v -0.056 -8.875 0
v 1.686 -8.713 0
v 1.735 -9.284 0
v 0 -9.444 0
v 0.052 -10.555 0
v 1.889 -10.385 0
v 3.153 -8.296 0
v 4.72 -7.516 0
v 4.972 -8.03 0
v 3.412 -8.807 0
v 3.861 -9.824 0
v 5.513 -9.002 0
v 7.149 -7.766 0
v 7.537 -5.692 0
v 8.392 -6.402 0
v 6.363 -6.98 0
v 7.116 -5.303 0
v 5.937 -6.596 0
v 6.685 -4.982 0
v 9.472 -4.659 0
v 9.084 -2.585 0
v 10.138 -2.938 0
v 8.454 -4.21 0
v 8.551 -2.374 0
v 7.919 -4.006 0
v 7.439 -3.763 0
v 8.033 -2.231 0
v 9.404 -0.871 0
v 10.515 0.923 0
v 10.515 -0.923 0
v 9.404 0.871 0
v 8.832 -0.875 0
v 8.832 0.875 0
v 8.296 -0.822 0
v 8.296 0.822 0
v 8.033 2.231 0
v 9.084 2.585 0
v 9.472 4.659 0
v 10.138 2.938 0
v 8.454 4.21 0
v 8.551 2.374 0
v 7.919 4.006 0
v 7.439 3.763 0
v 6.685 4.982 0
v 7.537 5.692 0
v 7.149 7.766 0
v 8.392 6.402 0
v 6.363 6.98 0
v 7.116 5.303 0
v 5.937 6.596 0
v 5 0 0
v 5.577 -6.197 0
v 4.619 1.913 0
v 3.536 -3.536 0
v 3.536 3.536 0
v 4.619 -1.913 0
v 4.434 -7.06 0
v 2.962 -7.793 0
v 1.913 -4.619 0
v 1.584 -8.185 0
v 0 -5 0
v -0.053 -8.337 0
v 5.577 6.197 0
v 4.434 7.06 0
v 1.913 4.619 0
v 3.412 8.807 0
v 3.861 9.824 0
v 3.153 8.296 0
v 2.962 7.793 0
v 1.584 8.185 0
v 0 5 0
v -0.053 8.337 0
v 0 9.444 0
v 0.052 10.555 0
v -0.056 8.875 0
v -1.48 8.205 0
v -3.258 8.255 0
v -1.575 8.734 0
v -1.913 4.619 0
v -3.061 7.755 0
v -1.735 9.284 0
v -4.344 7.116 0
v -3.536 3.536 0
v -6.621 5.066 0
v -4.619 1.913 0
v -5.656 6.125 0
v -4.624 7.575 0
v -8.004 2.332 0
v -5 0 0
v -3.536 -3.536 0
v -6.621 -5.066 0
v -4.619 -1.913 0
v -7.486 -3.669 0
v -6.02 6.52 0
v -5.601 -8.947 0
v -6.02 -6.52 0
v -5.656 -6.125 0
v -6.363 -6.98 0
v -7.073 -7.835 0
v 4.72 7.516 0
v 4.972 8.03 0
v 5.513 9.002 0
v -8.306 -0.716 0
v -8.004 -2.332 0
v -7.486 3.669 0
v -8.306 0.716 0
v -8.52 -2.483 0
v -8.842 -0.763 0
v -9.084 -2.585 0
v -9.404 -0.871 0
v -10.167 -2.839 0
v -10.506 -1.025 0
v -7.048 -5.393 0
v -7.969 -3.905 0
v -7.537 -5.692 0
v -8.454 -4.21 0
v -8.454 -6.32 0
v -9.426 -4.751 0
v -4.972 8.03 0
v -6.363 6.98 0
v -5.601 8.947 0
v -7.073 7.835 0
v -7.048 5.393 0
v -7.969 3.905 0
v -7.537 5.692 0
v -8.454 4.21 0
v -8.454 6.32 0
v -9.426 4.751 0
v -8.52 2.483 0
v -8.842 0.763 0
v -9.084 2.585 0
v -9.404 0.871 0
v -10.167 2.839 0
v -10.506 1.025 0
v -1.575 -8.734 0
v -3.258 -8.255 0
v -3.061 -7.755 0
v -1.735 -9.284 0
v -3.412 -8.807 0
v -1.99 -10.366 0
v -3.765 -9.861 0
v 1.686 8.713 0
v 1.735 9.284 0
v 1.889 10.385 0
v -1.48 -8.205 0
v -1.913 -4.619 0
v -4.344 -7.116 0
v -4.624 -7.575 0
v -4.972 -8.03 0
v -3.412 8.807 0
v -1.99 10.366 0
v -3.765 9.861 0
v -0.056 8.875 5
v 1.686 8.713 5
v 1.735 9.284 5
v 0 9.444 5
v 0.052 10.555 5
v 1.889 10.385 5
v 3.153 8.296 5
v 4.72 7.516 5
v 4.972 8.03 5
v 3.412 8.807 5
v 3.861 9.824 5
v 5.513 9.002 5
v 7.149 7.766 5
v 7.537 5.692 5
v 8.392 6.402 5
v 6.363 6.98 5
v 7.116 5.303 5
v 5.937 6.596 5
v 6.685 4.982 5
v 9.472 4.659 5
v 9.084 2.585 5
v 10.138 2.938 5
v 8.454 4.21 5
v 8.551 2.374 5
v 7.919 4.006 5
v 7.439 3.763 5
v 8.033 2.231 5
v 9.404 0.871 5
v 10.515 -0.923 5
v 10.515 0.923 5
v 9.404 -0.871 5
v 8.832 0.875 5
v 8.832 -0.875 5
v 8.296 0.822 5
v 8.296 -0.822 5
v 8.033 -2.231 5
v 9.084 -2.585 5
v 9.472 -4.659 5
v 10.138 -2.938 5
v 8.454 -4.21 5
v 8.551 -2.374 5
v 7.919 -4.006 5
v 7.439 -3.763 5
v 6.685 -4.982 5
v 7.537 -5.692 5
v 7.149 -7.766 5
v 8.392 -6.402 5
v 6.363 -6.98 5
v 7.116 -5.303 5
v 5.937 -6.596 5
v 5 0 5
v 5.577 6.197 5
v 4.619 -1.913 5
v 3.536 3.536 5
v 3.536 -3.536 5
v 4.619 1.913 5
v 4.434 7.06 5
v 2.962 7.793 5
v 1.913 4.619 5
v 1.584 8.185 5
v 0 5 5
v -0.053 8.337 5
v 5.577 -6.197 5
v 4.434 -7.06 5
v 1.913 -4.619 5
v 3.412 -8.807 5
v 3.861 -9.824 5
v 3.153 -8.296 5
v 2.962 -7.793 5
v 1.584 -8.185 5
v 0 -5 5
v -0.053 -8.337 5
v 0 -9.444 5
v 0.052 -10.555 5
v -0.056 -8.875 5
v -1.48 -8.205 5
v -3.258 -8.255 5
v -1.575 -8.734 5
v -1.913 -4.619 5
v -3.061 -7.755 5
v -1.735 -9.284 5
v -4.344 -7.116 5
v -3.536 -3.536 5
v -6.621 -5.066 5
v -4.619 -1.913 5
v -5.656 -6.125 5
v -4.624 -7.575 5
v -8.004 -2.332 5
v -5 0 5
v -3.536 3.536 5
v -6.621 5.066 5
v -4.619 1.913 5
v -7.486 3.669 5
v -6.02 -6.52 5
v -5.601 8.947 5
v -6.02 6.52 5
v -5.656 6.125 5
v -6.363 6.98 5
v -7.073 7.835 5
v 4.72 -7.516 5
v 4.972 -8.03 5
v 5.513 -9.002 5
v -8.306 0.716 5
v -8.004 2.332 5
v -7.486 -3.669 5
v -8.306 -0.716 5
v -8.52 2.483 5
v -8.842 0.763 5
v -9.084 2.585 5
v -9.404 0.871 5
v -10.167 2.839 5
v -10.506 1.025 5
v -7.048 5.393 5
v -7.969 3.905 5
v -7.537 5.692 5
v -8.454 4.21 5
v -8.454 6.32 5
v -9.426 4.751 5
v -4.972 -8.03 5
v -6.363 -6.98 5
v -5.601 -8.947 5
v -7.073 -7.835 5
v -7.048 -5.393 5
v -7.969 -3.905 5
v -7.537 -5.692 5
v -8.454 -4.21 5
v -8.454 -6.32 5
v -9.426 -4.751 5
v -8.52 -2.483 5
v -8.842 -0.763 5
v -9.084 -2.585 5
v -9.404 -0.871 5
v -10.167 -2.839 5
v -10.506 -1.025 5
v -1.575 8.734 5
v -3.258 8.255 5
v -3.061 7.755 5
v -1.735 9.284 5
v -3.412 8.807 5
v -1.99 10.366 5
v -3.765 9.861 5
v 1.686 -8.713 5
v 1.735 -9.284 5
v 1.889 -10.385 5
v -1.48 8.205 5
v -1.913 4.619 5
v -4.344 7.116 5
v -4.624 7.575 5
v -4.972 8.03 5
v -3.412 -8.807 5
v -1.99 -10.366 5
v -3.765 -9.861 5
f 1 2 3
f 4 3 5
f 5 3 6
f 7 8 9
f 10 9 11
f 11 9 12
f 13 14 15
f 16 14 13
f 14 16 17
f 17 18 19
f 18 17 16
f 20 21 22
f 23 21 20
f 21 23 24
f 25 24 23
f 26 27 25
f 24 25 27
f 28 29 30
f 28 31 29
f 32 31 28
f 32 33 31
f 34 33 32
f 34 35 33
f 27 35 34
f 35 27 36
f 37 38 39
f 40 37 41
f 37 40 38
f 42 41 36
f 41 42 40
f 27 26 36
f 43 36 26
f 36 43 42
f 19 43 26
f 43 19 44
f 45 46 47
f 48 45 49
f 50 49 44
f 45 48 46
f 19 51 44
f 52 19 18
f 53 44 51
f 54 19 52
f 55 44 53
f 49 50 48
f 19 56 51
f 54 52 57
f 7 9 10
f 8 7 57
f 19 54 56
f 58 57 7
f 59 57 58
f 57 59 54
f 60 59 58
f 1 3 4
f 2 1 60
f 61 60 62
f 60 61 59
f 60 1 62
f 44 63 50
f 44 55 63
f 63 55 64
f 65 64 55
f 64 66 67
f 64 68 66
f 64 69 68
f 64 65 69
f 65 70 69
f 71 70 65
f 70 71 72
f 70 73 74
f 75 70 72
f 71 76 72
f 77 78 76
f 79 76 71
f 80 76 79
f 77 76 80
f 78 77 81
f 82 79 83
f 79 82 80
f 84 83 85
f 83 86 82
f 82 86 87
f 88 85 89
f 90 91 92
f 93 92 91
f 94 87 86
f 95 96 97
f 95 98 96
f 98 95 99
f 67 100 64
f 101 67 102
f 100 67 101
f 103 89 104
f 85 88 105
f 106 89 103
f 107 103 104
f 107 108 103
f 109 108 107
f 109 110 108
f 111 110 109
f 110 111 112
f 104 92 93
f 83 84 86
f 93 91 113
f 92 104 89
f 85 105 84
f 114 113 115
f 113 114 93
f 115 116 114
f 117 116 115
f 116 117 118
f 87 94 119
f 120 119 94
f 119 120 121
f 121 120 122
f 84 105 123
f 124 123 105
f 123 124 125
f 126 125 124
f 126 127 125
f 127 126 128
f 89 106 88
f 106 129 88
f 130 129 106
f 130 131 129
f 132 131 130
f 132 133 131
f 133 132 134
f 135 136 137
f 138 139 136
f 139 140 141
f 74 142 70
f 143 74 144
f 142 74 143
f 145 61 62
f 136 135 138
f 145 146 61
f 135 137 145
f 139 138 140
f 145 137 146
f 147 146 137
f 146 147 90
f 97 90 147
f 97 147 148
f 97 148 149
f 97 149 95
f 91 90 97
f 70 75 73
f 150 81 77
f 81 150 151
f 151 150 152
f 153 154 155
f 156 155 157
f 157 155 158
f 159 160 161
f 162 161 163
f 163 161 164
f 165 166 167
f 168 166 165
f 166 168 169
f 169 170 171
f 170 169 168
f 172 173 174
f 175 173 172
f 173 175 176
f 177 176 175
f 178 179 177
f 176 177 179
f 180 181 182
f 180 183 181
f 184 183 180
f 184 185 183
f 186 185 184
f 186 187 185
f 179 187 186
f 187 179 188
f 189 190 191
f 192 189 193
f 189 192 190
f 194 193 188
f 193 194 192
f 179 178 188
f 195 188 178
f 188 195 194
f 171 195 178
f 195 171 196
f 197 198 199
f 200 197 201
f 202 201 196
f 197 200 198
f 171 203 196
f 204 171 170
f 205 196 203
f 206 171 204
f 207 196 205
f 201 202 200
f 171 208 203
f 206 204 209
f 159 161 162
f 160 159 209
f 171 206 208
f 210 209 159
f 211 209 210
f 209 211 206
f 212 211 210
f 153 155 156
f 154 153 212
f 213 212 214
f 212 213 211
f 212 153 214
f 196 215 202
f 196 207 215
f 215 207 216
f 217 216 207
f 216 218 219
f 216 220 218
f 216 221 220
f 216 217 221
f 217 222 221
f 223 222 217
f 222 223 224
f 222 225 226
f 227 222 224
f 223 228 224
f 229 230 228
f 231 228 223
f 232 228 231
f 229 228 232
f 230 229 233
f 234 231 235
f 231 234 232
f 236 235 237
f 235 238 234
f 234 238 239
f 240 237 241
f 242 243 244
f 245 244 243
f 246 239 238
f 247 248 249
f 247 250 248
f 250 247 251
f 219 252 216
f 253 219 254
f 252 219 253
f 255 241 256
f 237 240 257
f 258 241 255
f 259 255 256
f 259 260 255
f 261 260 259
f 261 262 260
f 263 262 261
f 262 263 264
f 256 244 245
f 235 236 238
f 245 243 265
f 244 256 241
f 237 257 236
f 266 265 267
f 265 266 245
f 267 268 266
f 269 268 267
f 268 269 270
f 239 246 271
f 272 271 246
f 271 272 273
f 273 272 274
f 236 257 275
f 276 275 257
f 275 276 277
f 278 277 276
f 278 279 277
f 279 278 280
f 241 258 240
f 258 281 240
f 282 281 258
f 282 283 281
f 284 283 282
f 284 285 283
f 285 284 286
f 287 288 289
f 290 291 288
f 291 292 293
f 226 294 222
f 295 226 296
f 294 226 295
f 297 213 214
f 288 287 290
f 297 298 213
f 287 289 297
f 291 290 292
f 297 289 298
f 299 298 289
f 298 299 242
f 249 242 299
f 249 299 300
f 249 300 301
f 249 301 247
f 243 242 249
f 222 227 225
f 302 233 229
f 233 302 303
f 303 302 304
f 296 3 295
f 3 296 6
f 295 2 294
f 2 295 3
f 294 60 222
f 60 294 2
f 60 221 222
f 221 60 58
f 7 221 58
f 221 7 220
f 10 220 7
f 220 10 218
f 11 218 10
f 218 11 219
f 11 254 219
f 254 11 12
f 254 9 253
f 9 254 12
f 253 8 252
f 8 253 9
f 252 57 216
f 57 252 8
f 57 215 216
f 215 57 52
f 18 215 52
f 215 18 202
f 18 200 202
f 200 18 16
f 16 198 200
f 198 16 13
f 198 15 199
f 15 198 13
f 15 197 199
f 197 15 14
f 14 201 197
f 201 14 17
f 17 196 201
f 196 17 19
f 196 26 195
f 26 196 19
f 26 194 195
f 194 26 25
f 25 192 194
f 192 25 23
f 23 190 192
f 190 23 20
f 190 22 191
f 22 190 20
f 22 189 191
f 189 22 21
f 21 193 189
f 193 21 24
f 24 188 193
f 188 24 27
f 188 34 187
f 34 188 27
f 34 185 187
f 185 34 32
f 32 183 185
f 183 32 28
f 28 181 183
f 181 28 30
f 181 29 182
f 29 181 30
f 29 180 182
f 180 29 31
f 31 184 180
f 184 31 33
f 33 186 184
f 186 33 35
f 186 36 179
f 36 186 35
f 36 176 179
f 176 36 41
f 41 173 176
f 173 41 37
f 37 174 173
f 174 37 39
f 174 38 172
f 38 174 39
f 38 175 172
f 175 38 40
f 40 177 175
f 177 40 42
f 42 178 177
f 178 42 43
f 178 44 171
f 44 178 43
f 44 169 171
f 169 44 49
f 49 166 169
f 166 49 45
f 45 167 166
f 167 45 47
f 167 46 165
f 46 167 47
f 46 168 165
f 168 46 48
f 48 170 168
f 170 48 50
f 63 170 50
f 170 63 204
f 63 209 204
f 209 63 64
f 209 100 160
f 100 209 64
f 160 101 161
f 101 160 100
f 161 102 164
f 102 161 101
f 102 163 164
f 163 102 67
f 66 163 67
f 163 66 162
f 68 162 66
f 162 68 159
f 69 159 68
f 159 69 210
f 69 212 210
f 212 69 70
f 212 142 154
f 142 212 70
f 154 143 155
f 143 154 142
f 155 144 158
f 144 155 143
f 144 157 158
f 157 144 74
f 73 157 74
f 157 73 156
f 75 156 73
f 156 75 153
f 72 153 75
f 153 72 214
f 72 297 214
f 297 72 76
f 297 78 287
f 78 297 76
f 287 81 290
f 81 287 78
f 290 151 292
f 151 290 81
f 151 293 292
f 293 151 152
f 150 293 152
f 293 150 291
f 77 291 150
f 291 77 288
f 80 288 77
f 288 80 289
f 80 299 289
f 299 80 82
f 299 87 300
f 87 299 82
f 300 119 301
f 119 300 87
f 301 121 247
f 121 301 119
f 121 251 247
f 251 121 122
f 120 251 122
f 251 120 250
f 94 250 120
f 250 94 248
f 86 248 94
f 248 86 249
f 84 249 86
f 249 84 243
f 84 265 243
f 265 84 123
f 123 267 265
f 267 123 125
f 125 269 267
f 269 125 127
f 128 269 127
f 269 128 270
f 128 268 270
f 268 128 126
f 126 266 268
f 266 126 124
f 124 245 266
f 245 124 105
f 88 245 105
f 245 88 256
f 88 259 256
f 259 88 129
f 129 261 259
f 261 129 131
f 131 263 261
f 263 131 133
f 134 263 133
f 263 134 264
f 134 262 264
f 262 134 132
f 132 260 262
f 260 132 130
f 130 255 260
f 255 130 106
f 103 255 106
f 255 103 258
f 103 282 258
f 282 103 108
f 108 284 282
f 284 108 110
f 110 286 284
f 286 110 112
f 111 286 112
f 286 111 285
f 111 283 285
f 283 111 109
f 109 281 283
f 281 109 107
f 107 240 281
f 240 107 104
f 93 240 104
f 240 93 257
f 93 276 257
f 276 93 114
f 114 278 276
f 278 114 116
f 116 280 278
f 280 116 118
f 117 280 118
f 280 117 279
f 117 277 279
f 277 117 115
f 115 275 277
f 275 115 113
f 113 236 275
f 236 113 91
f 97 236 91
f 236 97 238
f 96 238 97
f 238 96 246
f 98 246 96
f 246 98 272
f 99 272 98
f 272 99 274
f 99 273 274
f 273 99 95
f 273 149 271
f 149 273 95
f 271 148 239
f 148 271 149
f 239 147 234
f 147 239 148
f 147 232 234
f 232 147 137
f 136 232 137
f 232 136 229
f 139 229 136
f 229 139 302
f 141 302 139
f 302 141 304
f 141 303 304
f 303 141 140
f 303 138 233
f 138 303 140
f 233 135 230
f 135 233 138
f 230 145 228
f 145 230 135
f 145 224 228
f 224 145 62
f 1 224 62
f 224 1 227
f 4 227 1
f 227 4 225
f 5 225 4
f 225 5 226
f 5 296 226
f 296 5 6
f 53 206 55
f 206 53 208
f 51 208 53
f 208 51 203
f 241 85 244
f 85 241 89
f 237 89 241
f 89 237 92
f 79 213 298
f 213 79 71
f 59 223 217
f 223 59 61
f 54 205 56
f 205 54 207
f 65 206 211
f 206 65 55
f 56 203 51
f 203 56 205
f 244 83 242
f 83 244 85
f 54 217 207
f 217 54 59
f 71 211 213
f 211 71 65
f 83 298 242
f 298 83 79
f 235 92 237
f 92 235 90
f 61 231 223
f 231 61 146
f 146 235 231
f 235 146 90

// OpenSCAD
include <MCAD/gears.scad>;

difference(){
    translate([0,0,2.5]){
        linear_extrude(height=5, center=true, convexity=10) {
            gear(number_of_teeth=17,circular_pitch=200);
        }
    }
    translate([0,0,-1]){
        cylinder(h=20,r=5,center=true);
    }
}
